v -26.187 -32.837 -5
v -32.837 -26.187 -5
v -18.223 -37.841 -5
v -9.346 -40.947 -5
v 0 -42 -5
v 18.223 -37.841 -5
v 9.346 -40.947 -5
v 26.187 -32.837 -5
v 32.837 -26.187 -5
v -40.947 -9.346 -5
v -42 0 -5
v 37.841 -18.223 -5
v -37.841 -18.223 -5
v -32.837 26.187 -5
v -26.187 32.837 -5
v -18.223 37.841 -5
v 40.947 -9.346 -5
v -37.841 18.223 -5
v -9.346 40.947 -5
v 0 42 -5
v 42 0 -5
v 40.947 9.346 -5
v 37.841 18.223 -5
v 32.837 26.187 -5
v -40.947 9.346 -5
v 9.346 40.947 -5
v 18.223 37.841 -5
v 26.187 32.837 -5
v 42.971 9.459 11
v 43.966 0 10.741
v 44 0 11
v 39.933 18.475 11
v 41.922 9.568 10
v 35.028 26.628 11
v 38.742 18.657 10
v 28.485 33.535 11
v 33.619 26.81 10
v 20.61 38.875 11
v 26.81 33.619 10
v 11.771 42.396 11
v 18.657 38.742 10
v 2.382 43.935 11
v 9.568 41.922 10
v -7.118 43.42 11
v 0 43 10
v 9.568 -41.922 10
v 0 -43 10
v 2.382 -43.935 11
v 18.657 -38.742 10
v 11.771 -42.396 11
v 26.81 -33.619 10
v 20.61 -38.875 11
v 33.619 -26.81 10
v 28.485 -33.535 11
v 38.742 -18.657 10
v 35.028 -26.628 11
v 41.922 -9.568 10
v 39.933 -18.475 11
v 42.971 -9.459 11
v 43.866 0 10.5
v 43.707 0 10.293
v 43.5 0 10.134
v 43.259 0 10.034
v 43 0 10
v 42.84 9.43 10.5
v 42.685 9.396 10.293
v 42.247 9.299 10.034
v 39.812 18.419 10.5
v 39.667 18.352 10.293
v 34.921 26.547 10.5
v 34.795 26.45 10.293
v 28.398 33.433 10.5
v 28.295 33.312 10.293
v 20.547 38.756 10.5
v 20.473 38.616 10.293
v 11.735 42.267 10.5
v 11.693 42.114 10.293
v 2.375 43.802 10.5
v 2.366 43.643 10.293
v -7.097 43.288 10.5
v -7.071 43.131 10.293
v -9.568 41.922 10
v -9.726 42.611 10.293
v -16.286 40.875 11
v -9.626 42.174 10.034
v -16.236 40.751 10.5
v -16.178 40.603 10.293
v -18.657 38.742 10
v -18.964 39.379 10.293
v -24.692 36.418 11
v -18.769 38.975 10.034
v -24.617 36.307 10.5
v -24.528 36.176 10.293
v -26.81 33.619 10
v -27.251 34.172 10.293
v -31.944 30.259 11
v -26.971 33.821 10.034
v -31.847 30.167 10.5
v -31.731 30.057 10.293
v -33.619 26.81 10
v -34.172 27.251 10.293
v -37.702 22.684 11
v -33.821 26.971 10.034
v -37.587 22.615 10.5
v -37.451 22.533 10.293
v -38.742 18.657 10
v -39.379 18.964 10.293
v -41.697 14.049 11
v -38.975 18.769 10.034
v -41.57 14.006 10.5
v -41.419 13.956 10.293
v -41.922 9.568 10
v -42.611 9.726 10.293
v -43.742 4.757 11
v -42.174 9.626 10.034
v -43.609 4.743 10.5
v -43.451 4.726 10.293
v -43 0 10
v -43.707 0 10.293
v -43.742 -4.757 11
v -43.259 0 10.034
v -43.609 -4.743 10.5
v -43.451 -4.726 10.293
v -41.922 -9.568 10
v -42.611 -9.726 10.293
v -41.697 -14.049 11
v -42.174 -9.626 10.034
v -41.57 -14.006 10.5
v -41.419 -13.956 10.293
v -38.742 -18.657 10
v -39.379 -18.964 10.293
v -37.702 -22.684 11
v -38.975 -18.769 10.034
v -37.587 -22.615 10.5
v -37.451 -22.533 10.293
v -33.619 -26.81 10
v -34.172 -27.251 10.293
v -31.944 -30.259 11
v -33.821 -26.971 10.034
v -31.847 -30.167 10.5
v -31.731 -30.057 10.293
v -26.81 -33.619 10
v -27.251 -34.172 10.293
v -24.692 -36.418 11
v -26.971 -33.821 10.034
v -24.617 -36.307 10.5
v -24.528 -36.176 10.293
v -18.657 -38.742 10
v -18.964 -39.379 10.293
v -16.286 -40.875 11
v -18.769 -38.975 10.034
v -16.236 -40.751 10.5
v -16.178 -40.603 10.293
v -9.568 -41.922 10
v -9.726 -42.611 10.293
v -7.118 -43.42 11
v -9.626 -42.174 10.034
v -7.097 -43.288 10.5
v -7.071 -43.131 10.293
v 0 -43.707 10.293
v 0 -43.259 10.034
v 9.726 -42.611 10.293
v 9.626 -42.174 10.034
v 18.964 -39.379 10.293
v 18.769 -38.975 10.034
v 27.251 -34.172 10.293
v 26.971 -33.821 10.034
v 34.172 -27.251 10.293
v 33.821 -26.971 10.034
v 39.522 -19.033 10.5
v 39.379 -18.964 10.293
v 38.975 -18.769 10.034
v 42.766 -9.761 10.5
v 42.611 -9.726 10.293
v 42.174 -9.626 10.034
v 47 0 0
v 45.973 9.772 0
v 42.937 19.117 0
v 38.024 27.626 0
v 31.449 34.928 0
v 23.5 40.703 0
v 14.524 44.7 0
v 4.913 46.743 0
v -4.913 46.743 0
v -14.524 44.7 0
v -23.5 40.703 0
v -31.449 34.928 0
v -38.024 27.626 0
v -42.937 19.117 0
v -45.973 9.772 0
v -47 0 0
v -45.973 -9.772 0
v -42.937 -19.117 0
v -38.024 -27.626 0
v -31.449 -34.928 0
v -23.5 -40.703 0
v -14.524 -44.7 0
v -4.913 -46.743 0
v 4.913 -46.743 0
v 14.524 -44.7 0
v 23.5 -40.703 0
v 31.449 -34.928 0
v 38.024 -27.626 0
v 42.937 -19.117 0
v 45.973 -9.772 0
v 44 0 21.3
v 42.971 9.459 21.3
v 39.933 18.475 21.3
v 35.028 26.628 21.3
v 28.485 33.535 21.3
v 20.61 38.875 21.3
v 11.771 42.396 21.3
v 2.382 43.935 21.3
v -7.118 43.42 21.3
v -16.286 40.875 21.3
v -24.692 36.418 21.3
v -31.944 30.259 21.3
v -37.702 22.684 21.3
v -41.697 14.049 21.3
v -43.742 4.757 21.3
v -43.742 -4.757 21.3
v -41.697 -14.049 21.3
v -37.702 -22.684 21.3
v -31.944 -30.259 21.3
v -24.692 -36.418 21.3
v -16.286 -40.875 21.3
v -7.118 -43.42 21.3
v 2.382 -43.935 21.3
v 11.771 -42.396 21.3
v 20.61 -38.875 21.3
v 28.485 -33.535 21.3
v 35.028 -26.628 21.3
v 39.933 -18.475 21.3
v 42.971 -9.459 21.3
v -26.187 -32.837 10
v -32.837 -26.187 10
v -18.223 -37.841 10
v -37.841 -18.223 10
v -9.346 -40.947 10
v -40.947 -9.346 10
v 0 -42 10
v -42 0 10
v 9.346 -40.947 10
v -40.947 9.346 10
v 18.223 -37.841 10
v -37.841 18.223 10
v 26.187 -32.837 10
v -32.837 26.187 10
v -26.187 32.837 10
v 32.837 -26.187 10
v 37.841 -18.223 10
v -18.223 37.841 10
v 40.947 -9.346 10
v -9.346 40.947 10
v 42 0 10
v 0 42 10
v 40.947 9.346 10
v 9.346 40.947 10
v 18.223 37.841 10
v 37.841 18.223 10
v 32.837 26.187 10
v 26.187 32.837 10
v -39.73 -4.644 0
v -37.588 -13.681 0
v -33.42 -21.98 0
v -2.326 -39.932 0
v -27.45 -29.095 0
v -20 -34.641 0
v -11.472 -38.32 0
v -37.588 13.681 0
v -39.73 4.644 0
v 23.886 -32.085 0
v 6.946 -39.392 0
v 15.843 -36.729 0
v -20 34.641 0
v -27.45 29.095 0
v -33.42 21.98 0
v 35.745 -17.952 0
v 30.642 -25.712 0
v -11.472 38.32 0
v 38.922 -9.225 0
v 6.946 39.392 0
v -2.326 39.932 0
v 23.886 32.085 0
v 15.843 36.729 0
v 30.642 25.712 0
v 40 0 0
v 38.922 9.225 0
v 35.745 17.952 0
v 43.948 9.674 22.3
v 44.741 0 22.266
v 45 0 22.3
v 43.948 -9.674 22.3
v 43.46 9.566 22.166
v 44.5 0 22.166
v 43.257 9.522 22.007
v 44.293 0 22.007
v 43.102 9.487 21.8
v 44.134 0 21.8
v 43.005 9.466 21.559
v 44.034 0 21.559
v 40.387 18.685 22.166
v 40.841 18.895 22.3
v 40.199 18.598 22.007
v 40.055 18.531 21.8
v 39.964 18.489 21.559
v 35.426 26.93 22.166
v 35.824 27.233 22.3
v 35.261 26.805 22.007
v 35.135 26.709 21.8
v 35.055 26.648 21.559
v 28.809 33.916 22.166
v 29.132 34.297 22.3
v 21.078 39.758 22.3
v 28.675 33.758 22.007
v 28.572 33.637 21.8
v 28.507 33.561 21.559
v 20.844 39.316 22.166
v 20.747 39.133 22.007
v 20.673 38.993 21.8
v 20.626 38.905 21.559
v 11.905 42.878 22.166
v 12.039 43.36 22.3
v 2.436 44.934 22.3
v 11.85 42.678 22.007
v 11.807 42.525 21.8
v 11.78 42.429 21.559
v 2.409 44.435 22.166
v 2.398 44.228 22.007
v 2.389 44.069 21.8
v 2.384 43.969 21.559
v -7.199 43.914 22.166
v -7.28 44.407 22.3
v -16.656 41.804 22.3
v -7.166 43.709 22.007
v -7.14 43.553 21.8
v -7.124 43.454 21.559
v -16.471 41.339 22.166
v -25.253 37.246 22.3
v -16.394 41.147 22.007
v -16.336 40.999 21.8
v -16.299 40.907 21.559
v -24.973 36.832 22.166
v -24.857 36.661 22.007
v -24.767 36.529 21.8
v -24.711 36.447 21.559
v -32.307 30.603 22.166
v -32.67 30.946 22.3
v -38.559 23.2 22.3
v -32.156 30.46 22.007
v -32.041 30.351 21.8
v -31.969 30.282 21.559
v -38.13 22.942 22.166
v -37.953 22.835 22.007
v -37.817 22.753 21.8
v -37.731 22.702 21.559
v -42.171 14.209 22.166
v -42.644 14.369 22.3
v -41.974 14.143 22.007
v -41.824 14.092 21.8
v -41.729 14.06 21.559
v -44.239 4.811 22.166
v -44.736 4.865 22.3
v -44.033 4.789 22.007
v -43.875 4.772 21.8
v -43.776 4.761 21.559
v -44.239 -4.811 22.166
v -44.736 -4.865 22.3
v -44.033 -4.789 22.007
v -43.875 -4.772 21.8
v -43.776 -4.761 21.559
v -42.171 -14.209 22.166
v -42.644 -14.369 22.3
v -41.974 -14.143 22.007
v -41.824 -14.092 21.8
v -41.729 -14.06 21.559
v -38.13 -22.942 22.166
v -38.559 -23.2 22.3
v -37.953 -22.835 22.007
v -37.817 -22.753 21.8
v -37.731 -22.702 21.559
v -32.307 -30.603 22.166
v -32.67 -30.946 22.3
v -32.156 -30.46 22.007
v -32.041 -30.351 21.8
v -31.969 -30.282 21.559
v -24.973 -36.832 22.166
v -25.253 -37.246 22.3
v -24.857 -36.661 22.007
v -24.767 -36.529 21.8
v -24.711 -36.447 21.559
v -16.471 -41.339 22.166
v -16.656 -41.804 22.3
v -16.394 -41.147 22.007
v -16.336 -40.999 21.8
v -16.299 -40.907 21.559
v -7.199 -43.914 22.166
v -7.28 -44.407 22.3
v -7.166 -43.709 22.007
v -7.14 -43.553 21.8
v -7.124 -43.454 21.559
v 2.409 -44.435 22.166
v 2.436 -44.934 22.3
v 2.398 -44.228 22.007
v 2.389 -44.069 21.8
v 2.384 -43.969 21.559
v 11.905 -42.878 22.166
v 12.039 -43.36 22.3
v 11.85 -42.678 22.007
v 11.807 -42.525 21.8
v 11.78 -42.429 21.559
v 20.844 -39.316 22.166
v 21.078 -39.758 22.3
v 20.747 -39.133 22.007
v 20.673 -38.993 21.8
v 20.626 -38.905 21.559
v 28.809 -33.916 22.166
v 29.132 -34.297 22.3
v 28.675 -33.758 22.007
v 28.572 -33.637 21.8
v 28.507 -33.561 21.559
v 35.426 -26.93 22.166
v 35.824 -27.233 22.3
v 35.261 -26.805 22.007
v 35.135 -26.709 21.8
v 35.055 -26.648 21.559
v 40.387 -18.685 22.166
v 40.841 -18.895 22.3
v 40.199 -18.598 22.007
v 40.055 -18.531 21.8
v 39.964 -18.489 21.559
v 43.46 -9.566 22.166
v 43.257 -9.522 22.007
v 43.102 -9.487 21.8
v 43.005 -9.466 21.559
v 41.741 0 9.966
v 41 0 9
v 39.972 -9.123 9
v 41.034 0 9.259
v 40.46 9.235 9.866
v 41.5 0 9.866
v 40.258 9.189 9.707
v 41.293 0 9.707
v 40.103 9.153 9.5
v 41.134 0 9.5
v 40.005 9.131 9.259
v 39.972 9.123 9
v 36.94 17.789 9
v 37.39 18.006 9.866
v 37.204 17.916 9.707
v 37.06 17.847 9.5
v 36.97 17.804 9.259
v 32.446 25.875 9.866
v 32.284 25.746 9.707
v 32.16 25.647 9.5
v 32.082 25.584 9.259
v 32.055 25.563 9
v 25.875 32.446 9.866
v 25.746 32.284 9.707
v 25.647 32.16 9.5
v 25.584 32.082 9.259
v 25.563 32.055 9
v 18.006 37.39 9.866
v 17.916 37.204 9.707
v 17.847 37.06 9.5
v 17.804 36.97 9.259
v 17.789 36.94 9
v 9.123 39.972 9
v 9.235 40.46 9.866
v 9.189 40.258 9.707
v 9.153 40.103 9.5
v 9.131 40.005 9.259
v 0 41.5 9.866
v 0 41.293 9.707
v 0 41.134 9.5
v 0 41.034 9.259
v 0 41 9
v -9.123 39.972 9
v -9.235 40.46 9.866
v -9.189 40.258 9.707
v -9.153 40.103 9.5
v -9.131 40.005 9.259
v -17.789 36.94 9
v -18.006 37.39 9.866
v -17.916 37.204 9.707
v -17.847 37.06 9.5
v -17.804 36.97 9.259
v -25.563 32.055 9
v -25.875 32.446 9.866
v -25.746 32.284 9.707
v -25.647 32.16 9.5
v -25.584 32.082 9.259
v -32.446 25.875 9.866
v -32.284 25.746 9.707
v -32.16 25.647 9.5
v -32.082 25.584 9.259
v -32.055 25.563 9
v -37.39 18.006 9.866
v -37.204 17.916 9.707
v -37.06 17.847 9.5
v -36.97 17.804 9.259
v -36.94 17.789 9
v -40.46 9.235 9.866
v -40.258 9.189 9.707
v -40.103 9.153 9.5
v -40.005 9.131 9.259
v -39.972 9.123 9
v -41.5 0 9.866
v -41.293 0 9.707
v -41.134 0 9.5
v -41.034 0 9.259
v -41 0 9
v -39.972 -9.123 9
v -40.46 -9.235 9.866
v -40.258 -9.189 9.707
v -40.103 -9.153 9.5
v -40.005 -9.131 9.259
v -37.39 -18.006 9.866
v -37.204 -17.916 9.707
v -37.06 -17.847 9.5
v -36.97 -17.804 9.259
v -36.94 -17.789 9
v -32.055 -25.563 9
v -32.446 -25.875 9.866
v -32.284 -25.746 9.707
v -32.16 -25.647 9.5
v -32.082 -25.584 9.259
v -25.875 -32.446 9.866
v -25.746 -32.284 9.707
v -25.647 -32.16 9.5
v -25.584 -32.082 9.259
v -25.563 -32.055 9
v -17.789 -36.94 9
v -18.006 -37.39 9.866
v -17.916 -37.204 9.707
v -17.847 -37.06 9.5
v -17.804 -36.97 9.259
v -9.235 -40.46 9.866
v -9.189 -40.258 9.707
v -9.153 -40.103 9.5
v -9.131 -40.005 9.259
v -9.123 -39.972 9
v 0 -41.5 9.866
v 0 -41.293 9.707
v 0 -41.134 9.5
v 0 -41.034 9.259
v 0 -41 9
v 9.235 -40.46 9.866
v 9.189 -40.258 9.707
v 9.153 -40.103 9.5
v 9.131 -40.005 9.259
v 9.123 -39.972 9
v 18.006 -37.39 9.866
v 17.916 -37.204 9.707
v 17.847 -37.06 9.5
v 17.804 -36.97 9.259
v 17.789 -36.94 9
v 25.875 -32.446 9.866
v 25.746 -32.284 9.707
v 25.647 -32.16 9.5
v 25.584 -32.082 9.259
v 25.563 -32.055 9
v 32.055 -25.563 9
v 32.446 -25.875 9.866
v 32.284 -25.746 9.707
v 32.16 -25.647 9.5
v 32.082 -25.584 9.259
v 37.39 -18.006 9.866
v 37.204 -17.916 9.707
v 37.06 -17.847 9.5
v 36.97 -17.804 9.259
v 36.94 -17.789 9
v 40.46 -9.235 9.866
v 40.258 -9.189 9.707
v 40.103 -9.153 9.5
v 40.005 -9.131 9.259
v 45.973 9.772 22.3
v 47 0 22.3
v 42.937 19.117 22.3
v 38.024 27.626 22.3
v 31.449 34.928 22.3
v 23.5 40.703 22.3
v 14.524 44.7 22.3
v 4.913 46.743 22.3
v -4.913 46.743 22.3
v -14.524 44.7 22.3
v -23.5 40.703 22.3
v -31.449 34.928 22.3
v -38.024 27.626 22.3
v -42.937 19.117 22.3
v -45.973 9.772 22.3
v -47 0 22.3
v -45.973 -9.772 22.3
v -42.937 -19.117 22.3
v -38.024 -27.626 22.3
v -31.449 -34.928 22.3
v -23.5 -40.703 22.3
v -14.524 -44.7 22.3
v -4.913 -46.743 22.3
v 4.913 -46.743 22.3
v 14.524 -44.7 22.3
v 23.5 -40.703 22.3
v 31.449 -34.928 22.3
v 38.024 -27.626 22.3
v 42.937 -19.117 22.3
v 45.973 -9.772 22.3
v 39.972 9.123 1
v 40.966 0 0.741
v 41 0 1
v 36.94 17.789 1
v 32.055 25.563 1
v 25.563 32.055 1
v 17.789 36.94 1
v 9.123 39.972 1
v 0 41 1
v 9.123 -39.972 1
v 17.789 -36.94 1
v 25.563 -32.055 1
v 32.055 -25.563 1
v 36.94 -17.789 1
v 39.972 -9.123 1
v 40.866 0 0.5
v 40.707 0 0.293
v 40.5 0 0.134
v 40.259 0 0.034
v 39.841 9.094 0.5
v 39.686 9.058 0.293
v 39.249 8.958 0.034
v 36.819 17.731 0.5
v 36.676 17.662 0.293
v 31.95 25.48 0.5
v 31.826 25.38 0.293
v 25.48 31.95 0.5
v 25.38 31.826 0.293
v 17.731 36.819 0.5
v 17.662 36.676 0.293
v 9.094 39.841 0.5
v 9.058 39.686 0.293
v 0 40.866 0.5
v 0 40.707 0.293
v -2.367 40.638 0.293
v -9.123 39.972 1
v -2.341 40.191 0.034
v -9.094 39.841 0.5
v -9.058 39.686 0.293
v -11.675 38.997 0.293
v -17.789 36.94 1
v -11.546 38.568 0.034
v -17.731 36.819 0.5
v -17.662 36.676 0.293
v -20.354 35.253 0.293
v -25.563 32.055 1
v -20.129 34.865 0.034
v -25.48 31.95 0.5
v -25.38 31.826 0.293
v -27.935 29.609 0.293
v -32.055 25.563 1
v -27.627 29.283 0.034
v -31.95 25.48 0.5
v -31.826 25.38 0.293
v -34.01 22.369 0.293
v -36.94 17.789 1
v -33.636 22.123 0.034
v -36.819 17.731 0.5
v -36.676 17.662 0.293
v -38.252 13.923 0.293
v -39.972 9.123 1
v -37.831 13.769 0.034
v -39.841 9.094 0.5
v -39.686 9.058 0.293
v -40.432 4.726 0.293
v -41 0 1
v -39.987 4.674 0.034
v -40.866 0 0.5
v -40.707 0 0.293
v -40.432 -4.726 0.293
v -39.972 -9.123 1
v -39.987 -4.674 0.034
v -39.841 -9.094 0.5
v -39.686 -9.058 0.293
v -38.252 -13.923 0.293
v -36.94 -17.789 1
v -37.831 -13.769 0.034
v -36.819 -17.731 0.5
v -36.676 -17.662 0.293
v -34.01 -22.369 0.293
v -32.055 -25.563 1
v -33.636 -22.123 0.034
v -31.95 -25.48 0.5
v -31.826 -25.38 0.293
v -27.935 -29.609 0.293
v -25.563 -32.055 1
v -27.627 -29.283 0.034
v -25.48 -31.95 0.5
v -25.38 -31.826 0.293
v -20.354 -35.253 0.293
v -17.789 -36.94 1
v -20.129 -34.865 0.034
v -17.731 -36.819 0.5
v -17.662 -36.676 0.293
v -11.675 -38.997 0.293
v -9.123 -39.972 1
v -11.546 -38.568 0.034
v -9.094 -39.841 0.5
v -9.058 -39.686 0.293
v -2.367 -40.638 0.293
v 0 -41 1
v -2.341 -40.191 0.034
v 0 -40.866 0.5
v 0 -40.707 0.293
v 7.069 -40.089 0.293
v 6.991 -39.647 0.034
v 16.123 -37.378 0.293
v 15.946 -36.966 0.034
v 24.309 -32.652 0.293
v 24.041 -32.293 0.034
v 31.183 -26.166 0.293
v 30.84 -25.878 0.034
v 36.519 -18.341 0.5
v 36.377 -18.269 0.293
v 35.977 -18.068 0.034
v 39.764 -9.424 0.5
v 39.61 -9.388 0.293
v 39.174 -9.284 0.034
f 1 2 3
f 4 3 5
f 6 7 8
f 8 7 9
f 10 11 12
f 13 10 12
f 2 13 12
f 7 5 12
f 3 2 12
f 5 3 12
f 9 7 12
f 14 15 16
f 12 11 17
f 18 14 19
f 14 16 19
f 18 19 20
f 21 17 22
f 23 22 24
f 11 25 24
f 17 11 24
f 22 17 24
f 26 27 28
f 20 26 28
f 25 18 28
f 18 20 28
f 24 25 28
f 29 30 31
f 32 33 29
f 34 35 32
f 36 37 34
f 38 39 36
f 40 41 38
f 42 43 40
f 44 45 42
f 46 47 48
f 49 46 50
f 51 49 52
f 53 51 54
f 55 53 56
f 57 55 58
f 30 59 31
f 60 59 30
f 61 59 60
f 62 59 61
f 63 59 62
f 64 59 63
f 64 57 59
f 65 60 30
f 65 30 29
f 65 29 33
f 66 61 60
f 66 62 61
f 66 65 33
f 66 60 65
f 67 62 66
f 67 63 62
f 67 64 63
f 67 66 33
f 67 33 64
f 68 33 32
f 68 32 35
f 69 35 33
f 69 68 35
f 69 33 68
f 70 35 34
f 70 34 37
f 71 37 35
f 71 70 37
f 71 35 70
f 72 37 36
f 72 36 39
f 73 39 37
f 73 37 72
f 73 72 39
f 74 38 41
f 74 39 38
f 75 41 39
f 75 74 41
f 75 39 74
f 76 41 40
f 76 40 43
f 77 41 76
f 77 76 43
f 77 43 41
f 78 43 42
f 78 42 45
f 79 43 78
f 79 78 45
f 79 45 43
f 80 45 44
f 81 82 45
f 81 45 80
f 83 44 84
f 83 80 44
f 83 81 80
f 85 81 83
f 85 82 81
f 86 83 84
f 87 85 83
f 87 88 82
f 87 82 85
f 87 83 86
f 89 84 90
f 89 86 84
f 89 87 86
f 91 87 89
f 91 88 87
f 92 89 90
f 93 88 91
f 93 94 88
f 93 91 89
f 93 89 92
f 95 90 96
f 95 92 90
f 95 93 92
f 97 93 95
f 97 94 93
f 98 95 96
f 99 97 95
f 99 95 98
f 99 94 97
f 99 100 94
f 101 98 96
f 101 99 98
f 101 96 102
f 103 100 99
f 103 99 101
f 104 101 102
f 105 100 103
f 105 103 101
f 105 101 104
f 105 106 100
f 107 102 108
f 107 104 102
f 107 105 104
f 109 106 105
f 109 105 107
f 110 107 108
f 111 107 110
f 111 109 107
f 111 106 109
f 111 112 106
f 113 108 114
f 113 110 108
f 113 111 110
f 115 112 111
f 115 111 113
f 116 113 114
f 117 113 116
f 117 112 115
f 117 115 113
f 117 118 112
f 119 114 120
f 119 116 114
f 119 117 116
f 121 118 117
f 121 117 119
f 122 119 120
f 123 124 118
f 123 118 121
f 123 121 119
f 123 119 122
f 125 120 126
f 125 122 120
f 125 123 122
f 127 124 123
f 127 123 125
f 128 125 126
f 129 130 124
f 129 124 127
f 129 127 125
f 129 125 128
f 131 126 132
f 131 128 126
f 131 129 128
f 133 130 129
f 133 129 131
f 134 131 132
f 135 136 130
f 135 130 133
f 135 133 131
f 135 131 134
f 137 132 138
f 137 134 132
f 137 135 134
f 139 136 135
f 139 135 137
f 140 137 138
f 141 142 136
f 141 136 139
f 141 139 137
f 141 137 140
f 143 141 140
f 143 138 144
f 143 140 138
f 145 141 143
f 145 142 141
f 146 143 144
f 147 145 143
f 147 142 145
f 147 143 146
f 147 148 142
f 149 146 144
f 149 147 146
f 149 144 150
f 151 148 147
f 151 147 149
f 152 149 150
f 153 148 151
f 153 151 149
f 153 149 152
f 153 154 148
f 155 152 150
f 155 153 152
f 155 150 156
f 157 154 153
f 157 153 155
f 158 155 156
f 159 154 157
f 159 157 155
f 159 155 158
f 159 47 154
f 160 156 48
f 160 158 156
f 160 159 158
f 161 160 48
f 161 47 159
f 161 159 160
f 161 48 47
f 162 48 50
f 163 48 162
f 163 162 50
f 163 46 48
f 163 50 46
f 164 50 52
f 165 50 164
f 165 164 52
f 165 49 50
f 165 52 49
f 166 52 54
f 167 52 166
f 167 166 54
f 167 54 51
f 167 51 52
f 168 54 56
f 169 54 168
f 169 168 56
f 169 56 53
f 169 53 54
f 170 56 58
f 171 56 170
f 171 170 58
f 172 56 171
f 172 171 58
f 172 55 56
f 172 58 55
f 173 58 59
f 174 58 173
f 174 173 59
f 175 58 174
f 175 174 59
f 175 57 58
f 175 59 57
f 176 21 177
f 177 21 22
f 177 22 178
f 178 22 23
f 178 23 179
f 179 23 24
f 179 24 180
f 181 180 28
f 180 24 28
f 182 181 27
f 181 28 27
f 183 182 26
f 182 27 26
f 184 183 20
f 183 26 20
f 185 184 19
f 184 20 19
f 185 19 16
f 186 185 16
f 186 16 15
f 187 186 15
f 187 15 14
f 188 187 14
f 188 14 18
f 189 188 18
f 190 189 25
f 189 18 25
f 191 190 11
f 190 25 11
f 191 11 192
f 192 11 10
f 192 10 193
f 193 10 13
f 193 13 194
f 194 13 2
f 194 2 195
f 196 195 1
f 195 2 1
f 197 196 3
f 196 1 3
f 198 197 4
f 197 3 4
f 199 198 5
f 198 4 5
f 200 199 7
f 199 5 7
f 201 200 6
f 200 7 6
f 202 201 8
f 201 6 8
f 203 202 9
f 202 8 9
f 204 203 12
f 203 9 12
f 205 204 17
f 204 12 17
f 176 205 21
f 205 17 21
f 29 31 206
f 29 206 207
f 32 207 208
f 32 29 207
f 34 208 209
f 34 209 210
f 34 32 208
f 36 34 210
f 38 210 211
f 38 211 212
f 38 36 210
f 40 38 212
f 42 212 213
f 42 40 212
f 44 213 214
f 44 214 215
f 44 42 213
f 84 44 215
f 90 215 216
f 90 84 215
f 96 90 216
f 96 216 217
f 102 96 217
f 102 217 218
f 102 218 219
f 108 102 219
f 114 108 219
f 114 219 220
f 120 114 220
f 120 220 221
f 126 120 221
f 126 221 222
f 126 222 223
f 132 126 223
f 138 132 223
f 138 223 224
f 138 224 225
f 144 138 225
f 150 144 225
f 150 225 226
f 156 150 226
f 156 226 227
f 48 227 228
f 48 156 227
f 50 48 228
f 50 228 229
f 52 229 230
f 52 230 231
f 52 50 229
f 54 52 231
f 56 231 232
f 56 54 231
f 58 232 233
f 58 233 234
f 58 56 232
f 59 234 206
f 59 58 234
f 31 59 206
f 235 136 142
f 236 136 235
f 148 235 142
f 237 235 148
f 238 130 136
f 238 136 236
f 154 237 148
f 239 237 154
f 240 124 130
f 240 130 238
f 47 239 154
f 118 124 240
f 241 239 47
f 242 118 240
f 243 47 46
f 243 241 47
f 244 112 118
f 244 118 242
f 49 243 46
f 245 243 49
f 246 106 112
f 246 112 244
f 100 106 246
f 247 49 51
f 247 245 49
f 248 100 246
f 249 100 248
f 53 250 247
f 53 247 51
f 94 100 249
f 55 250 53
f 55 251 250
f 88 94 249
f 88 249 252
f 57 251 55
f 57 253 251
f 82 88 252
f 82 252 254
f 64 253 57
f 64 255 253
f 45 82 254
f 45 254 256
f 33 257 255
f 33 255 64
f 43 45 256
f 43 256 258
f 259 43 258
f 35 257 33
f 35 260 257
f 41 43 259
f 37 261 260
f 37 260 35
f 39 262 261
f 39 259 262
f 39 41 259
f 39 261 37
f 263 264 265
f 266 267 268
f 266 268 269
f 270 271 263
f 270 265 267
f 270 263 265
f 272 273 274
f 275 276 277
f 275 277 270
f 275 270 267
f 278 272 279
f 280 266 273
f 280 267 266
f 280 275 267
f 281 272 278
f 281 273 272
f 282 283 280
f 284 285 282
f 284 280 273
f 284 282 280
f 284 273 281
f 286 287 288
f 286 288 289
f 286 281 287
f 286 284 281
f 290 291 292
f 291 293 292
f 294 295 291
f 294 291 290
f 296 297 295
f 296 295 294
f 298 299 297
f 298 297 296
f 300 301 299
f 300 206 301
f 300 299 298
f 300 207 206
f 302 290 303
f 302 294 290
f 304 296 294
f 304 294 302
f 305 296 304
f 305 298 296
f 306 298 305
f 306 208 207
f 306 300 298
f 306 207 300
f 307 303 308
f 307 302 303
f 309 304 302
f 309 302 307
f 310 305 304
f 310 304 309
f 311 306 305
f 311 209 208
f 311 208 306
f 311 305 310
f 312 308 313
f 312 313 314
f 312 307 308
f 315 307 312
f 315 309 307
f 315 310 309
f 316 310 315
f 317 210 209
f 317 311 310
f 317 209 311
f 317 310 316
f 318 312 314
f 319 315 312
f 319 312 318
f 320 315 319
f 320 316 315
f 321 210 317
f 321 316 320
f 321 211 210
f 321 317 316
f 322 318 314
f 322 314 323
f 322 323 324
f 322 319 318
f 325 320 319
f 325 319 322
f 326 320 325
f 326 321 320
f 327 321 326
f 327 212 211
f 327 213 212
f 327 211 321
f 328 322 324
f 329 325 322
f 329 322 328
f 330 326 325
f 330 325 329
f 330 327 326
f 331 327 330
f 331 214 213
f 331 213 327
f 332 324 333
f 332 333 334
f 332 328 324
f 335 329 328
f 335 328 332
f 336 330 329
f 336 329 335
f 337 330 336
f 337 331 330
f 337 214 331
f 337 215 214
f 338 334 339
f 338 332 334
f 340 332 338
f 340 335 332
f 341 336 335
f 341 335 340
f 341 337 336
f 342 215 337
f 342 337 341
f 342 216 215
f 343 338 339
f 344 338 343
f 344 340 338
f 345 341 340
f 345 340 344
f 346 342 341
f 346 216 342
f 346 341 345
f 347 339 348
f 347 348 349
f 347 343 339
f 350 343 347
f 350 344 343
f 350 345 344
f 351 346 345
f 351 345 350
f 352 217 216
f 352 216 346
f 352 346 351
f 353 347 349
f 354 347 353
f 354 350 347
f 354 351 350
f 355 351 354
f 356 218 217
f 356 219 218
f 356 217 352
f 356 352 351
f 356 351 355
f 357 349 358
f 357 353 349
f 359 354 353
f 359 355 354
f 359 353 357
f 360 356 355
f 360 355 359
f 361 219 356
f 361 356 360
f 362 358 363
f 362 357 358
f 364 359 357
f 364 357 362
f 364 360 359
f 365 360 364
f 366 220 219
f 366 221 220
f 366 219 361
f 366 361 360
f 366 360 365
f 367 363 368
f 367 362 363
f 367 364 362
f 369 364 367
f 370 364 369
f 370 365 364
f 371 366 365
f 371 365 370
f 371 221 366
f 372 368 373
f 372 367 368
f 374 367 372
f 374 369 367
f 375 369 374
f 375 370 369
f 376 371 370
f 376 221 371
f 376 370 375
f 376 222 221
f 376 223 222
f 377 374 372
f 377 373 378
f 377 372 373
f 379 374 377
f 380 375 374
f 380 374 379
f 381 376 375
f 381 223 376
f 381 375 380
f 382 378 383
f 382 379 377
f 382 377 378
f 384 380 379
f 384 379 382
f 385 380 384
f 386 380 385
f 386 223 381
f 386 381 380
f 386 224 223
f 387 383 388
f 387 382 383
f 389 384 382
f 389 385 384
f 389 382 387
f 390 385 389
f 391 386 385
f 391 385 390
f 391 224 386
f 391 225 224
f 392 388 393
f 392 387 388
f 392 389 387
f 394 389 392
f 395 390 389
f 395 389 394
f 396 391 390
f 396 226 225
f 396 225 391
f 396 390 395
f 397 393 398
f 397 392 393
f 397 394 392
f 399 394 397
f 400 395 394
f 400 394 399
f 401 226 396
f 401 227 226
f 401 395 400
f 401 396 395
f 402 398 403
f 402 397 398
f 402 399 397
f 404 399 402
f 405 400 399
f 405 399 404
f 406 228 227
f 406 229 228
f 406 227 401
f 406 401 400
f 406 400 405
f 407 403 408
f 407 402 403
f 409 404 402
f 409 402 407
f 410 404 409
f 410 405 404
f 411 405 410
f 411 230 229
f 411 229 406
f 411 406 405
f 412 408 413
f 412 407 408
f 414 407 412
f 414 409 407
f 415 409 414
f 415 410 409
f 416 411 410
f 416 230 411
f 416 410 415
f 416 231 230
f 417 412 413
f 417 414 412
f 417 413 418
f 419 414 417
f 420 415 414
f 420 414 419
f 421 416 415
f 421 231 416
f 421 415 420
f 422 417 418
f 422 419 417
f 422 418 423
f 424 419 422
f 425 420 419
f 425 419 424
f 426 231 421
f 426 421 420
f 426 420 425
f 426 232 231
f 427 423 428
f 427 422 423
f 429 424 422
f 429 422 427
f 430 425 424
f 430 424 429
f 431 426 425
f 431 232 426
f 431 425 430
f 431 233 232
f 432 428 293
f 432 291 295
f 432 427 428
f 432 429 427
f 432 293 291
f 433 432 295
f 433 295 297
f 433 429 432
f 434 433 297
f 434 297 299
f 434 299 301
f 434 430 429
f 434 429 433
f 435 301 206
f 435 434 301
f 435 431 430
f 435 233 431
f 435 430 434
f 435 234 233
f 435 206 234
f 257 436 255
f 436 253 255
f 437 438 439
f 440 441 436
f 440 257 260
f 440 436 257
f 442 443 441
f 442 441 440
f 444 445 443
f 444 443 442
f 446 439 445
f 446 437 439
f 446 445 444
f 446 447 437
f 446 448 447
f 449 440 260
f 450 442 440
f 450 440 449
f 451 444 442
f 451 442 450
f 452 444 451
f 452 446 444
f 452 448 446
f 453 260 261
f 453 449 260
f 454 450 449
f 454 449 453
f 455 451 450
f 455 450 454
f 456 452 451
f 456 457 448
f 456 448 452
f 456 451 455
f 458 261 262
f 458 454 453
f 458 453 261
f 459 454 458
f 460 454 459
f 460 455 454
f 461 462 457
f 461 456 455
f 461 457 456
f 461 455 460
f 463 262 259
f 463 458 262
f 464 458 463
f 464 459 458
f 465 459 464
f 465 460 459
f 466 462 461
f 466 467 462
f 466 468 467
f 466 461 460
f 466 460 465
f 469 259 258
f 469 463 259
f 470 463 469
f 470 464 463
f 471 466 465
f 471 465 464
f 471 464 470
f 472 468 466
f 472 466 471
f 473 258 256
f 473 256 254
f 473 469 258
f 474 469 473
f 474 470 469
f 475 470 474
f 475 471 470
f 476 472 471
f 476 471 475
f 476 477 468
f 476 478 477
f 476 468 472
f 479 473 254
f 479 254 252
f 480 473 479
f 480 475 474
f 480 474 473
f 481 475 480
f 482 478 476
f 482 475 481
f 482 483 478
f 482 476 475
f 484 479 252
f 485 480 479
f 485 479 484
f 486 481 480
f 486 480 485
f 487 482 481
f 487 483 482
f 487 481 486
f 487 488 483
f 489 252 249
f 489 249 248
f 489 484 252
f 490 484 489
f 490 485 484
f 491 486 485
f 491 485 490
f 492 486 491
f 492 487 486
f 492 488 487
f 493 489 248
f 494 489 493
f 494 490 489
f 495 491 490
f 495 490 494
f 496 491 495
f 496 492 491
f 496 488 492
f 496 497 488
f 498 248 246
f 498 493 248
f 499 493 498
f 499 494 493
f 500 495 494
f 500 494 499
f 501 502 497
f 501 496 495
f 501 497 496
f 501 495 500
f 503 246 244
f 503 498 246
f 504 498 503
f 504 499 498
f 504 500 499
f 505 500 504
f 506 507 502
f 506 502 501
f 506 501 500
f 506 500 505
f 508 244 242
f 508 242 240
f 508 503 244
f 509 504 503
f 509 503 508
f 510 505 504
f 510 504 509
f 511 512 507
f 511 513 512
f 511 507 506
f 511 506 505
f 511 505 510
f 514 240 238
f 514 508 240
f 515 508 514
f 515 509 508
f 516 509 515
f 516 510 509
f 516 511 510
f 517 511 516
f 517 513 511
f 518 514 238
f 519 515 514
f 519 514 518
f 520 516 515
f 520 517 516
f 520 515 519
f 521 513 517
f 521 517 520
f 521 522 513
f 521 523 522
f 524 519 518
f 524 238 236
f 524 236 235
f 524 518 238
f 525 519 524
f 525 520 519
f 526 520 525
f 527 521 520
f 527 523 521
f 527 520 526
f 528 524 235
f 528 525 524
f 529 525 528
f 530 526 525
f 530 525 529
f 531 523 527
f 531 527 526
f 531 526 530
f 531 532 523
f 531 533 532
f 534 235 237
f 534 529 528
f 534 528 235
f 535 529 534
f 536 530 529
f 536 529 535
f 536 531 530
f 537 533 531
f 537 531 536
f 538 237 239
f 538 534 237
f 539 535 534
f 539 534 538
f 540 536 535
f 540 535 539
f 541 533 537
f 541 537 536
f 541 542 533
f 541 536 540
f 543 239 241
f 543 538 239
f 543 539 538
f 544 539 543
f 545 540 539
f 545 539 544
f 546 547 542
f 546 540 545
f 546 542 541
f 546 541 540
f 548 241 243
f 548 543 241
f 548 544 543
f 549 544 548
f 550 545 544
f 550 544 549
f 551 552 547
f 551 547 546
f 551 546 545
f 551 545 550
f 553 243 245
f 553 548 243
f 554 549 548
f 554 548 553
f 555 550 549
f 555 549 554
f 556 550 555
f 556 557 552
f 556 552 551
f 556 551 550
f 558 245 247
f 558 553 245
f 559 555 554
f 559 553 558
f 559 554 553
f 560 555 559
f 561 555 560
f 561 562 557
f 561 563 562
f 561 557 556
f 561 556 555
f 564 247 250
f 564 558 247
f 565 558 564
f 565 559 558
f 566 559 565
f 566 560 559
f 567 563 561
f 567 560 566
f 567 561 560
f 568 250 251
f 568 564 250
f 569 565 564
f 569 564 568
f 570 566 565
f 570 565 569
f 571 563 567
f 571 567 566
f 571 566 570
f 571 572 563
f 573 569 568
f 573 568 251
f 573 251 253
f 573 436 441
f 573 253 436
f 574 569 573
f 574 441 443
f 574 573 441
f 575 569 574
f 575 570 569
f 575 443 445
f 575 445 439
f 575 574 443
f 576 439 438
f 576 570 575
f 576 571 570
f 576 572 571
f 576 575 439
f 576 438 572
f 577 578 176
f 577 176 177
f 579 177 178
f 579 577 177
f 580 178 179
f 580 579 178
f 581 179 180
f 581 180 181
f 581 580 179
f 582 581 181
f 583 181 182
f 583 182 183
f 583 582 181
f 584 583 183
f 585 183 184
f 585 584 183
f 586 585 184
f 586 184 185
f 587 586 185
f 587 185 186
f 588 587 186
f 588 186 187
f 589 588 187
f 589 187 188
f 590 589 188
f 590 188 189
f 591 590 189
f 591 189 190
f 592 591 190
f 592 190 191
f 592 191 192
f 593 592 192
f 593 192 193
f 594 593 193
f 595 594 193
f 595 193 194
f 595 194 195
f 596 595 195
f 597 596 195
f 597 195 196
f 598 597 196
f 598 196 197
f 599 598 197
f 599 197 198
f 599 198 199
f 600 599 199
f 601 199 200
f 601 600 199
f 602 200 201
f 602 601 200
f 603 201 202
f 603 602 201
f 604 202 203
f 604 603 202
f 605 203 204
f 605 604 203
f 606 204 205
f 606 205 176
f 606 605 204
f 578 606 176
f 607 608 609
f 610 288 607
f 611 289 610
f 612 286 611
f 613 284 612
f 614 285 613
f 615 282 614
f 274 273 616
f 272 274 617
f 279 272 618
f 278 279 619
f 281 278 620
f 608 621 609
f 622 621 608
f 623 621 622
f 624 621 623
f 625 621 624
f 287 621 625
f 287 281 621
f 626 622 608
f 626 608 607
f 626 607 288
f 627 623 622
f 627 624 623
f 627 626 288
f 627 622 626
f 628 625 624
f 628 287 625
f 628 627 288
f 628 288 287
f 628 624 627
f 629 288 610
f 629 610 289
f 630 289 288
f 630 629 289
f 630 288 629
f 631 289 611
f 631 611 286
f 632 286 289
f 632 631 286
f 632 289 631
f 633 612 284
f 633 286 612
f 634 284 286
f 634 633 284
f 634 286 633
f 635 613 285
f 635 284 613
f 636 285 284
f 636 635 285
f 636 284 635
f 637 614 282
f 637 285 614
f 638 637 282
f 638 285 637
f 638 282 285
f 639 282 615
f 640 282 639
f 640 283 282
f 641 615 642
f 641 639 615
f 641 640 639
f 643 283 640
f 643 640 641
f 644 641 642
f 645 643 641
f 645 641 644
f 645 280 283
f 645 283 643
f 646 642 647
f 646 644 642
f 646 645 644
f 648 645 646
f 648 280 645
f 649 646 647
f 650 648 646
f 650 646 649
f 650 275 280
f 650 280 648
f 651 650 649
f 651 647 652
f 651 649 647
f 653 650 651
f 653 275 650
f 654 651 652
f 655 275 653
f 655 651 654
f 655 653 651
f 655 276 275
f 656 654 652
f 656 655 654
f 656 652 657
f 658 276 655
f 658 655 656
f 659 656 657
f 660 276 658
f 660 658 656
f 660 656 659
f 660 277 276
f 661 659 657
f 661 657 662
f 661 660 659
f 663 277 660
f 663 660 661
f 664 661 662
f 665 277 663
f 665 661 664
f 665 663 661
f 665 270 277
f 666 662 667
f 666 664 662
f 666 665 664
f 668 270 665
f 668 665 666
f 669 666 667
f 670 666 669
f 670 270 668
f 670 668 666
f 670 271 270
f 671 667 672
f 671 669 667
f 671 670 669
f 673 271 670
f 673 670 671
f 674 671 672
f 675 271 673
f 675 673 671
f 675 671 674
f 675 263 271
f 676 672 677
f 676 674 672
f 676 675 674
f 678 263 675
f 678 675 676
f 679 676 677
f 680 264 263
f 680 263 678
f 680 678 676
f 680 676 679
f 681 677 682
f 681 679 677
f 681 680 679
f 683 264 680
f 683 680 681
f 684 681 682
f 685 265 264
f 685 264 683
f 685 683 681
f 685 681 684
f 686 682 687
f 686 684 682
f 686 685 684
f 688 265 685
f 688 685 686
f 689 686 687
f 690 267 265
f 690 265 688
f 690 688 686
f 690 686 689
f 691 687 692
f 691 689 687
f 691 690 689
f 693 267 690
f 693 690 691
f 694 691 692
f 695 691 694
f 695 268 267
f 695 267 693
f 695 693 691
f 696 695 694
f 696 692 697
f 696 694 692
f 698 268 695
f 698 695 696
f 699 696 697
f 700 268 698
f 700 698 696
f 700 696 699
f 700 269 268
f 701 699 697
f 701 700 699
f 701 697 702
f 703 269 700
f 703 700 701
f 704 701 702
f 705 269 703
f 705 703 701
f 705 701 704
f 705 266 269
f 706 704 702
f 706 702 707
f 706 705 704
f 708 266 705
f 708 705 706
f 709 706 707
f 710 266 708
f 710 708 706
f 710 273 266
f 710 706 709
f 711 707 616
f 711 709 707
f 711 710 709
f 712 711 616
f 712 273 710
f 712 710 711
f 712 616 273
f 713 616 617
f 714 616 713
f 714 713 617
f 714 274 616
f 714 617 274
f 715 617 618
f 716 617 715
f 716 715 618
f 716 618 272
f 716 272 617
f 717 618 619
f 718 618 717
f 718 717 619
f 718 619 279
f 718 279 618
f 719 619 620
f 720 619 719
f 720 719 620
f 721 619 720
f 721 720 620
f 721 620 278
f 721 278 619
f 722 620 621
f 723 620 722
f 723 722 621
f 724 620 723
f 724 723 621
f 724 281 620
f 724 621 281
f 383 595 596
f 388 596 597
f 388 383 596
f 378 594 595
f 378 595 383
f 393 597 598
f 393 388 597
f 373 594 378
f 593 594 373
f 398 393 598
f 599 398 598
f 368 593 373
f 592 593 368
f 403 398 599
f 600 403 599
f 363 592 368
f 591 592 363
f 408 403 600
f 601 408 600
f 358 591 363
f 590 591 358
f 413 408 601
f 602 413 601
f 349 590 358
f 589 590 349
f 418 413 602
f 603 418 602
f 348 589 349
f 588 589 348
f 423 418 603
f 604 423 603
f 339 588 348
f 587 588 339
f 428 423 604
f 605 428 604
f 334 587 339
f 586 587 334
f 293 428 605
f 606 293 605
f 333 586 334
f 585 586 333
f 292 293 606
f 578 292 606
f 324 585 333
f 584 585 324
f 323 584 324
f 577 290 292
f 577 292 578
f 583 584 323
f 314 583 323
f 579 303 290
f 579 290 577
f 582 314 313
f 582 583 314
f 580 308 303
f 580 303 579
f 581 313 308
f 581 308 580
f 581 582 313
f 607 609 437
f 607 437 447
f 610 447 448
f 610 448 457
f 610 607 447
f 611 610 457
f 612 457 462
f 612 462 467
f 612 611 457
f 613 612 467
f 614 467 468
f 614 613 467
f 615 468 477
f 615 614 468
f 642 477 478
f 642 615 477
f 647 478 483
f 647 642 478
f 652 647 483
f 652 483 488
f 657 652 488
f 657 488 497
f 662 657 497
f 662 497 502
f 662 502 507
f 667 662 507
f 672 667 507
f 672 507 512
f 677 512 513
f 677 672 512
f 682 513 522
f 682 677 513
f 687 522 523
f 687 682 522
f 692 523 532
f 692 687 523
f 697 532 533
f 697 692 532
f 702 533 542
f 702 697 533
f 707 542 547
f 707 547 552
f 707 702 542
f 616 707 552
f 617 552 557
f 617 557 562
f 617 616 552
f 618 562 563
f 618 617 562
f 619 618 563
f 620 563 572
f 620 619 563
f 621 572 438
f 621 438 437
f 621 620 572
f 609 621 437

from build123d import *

# Parameters (mm, degrees)
F0_R     = 47
F0_R_2   = 44
F1_DEPTH = 22.3
F0_R_3   = 41
F2_DEPTH = 10
F3_DEPTH = 5
F4_R     = 1
F5_SIZE  = 4.99999


# Not quite as in the source:
# - a fillet or chamfer is up to 0.001 mm smaller than in the source, because OpenCascade refuses the exact size


with BuildPart() as f1:
    # F0 (on Top) → F1 (new body)
    with BuildSketch(Plane.XY):
        Circle(F0_R)
        Circle(F0_R_2, mode=Mode.SUBTRACT)
    extrude(amount=F1_DEPTH)

    # F0 (on Top) → F2 (join)
    with BuildSketch(Plane.XY):
        Circle(F0_R_2)
        Circle(F0_R_3, mode=Mode.SUBTRACT)
    extrude(amount=F2_DEPTH)

    # F0 (on Top) → F3 (join)
    with BuildSketch(Plane.XY):
        Circle(F0_R)
        Circle(F0_R_2, mode=Mode.SUBTRACT)
        Circle(F0_R_2)
        Circle(F0_R_3, mode=Mode.SUBTRACT)
        Circle(F0_R_3)
    extrude(amount=-F3_DEPTH)

    # F4
    f4_edges = [f1.edges().sort_by_distance(p)[0] for p in [
        (-44, 0, 22.3),
        (-44, 0, 10),
        (-41, 0, 10),
        (-41, 0, 0),
    ]]
    fillet(f4_edges, radius=F4_R)

    # F5 (size 5 in the source; OpenCascade refuses exactly that, so slightly less here)
    f5_edges = [f1.edges().sort_by_distance(p)[0] for p in [
        (-47, 0, -5),
    ]]
    chamfer(f5_edges, length=F5_SIZE)


solid = f1.part
